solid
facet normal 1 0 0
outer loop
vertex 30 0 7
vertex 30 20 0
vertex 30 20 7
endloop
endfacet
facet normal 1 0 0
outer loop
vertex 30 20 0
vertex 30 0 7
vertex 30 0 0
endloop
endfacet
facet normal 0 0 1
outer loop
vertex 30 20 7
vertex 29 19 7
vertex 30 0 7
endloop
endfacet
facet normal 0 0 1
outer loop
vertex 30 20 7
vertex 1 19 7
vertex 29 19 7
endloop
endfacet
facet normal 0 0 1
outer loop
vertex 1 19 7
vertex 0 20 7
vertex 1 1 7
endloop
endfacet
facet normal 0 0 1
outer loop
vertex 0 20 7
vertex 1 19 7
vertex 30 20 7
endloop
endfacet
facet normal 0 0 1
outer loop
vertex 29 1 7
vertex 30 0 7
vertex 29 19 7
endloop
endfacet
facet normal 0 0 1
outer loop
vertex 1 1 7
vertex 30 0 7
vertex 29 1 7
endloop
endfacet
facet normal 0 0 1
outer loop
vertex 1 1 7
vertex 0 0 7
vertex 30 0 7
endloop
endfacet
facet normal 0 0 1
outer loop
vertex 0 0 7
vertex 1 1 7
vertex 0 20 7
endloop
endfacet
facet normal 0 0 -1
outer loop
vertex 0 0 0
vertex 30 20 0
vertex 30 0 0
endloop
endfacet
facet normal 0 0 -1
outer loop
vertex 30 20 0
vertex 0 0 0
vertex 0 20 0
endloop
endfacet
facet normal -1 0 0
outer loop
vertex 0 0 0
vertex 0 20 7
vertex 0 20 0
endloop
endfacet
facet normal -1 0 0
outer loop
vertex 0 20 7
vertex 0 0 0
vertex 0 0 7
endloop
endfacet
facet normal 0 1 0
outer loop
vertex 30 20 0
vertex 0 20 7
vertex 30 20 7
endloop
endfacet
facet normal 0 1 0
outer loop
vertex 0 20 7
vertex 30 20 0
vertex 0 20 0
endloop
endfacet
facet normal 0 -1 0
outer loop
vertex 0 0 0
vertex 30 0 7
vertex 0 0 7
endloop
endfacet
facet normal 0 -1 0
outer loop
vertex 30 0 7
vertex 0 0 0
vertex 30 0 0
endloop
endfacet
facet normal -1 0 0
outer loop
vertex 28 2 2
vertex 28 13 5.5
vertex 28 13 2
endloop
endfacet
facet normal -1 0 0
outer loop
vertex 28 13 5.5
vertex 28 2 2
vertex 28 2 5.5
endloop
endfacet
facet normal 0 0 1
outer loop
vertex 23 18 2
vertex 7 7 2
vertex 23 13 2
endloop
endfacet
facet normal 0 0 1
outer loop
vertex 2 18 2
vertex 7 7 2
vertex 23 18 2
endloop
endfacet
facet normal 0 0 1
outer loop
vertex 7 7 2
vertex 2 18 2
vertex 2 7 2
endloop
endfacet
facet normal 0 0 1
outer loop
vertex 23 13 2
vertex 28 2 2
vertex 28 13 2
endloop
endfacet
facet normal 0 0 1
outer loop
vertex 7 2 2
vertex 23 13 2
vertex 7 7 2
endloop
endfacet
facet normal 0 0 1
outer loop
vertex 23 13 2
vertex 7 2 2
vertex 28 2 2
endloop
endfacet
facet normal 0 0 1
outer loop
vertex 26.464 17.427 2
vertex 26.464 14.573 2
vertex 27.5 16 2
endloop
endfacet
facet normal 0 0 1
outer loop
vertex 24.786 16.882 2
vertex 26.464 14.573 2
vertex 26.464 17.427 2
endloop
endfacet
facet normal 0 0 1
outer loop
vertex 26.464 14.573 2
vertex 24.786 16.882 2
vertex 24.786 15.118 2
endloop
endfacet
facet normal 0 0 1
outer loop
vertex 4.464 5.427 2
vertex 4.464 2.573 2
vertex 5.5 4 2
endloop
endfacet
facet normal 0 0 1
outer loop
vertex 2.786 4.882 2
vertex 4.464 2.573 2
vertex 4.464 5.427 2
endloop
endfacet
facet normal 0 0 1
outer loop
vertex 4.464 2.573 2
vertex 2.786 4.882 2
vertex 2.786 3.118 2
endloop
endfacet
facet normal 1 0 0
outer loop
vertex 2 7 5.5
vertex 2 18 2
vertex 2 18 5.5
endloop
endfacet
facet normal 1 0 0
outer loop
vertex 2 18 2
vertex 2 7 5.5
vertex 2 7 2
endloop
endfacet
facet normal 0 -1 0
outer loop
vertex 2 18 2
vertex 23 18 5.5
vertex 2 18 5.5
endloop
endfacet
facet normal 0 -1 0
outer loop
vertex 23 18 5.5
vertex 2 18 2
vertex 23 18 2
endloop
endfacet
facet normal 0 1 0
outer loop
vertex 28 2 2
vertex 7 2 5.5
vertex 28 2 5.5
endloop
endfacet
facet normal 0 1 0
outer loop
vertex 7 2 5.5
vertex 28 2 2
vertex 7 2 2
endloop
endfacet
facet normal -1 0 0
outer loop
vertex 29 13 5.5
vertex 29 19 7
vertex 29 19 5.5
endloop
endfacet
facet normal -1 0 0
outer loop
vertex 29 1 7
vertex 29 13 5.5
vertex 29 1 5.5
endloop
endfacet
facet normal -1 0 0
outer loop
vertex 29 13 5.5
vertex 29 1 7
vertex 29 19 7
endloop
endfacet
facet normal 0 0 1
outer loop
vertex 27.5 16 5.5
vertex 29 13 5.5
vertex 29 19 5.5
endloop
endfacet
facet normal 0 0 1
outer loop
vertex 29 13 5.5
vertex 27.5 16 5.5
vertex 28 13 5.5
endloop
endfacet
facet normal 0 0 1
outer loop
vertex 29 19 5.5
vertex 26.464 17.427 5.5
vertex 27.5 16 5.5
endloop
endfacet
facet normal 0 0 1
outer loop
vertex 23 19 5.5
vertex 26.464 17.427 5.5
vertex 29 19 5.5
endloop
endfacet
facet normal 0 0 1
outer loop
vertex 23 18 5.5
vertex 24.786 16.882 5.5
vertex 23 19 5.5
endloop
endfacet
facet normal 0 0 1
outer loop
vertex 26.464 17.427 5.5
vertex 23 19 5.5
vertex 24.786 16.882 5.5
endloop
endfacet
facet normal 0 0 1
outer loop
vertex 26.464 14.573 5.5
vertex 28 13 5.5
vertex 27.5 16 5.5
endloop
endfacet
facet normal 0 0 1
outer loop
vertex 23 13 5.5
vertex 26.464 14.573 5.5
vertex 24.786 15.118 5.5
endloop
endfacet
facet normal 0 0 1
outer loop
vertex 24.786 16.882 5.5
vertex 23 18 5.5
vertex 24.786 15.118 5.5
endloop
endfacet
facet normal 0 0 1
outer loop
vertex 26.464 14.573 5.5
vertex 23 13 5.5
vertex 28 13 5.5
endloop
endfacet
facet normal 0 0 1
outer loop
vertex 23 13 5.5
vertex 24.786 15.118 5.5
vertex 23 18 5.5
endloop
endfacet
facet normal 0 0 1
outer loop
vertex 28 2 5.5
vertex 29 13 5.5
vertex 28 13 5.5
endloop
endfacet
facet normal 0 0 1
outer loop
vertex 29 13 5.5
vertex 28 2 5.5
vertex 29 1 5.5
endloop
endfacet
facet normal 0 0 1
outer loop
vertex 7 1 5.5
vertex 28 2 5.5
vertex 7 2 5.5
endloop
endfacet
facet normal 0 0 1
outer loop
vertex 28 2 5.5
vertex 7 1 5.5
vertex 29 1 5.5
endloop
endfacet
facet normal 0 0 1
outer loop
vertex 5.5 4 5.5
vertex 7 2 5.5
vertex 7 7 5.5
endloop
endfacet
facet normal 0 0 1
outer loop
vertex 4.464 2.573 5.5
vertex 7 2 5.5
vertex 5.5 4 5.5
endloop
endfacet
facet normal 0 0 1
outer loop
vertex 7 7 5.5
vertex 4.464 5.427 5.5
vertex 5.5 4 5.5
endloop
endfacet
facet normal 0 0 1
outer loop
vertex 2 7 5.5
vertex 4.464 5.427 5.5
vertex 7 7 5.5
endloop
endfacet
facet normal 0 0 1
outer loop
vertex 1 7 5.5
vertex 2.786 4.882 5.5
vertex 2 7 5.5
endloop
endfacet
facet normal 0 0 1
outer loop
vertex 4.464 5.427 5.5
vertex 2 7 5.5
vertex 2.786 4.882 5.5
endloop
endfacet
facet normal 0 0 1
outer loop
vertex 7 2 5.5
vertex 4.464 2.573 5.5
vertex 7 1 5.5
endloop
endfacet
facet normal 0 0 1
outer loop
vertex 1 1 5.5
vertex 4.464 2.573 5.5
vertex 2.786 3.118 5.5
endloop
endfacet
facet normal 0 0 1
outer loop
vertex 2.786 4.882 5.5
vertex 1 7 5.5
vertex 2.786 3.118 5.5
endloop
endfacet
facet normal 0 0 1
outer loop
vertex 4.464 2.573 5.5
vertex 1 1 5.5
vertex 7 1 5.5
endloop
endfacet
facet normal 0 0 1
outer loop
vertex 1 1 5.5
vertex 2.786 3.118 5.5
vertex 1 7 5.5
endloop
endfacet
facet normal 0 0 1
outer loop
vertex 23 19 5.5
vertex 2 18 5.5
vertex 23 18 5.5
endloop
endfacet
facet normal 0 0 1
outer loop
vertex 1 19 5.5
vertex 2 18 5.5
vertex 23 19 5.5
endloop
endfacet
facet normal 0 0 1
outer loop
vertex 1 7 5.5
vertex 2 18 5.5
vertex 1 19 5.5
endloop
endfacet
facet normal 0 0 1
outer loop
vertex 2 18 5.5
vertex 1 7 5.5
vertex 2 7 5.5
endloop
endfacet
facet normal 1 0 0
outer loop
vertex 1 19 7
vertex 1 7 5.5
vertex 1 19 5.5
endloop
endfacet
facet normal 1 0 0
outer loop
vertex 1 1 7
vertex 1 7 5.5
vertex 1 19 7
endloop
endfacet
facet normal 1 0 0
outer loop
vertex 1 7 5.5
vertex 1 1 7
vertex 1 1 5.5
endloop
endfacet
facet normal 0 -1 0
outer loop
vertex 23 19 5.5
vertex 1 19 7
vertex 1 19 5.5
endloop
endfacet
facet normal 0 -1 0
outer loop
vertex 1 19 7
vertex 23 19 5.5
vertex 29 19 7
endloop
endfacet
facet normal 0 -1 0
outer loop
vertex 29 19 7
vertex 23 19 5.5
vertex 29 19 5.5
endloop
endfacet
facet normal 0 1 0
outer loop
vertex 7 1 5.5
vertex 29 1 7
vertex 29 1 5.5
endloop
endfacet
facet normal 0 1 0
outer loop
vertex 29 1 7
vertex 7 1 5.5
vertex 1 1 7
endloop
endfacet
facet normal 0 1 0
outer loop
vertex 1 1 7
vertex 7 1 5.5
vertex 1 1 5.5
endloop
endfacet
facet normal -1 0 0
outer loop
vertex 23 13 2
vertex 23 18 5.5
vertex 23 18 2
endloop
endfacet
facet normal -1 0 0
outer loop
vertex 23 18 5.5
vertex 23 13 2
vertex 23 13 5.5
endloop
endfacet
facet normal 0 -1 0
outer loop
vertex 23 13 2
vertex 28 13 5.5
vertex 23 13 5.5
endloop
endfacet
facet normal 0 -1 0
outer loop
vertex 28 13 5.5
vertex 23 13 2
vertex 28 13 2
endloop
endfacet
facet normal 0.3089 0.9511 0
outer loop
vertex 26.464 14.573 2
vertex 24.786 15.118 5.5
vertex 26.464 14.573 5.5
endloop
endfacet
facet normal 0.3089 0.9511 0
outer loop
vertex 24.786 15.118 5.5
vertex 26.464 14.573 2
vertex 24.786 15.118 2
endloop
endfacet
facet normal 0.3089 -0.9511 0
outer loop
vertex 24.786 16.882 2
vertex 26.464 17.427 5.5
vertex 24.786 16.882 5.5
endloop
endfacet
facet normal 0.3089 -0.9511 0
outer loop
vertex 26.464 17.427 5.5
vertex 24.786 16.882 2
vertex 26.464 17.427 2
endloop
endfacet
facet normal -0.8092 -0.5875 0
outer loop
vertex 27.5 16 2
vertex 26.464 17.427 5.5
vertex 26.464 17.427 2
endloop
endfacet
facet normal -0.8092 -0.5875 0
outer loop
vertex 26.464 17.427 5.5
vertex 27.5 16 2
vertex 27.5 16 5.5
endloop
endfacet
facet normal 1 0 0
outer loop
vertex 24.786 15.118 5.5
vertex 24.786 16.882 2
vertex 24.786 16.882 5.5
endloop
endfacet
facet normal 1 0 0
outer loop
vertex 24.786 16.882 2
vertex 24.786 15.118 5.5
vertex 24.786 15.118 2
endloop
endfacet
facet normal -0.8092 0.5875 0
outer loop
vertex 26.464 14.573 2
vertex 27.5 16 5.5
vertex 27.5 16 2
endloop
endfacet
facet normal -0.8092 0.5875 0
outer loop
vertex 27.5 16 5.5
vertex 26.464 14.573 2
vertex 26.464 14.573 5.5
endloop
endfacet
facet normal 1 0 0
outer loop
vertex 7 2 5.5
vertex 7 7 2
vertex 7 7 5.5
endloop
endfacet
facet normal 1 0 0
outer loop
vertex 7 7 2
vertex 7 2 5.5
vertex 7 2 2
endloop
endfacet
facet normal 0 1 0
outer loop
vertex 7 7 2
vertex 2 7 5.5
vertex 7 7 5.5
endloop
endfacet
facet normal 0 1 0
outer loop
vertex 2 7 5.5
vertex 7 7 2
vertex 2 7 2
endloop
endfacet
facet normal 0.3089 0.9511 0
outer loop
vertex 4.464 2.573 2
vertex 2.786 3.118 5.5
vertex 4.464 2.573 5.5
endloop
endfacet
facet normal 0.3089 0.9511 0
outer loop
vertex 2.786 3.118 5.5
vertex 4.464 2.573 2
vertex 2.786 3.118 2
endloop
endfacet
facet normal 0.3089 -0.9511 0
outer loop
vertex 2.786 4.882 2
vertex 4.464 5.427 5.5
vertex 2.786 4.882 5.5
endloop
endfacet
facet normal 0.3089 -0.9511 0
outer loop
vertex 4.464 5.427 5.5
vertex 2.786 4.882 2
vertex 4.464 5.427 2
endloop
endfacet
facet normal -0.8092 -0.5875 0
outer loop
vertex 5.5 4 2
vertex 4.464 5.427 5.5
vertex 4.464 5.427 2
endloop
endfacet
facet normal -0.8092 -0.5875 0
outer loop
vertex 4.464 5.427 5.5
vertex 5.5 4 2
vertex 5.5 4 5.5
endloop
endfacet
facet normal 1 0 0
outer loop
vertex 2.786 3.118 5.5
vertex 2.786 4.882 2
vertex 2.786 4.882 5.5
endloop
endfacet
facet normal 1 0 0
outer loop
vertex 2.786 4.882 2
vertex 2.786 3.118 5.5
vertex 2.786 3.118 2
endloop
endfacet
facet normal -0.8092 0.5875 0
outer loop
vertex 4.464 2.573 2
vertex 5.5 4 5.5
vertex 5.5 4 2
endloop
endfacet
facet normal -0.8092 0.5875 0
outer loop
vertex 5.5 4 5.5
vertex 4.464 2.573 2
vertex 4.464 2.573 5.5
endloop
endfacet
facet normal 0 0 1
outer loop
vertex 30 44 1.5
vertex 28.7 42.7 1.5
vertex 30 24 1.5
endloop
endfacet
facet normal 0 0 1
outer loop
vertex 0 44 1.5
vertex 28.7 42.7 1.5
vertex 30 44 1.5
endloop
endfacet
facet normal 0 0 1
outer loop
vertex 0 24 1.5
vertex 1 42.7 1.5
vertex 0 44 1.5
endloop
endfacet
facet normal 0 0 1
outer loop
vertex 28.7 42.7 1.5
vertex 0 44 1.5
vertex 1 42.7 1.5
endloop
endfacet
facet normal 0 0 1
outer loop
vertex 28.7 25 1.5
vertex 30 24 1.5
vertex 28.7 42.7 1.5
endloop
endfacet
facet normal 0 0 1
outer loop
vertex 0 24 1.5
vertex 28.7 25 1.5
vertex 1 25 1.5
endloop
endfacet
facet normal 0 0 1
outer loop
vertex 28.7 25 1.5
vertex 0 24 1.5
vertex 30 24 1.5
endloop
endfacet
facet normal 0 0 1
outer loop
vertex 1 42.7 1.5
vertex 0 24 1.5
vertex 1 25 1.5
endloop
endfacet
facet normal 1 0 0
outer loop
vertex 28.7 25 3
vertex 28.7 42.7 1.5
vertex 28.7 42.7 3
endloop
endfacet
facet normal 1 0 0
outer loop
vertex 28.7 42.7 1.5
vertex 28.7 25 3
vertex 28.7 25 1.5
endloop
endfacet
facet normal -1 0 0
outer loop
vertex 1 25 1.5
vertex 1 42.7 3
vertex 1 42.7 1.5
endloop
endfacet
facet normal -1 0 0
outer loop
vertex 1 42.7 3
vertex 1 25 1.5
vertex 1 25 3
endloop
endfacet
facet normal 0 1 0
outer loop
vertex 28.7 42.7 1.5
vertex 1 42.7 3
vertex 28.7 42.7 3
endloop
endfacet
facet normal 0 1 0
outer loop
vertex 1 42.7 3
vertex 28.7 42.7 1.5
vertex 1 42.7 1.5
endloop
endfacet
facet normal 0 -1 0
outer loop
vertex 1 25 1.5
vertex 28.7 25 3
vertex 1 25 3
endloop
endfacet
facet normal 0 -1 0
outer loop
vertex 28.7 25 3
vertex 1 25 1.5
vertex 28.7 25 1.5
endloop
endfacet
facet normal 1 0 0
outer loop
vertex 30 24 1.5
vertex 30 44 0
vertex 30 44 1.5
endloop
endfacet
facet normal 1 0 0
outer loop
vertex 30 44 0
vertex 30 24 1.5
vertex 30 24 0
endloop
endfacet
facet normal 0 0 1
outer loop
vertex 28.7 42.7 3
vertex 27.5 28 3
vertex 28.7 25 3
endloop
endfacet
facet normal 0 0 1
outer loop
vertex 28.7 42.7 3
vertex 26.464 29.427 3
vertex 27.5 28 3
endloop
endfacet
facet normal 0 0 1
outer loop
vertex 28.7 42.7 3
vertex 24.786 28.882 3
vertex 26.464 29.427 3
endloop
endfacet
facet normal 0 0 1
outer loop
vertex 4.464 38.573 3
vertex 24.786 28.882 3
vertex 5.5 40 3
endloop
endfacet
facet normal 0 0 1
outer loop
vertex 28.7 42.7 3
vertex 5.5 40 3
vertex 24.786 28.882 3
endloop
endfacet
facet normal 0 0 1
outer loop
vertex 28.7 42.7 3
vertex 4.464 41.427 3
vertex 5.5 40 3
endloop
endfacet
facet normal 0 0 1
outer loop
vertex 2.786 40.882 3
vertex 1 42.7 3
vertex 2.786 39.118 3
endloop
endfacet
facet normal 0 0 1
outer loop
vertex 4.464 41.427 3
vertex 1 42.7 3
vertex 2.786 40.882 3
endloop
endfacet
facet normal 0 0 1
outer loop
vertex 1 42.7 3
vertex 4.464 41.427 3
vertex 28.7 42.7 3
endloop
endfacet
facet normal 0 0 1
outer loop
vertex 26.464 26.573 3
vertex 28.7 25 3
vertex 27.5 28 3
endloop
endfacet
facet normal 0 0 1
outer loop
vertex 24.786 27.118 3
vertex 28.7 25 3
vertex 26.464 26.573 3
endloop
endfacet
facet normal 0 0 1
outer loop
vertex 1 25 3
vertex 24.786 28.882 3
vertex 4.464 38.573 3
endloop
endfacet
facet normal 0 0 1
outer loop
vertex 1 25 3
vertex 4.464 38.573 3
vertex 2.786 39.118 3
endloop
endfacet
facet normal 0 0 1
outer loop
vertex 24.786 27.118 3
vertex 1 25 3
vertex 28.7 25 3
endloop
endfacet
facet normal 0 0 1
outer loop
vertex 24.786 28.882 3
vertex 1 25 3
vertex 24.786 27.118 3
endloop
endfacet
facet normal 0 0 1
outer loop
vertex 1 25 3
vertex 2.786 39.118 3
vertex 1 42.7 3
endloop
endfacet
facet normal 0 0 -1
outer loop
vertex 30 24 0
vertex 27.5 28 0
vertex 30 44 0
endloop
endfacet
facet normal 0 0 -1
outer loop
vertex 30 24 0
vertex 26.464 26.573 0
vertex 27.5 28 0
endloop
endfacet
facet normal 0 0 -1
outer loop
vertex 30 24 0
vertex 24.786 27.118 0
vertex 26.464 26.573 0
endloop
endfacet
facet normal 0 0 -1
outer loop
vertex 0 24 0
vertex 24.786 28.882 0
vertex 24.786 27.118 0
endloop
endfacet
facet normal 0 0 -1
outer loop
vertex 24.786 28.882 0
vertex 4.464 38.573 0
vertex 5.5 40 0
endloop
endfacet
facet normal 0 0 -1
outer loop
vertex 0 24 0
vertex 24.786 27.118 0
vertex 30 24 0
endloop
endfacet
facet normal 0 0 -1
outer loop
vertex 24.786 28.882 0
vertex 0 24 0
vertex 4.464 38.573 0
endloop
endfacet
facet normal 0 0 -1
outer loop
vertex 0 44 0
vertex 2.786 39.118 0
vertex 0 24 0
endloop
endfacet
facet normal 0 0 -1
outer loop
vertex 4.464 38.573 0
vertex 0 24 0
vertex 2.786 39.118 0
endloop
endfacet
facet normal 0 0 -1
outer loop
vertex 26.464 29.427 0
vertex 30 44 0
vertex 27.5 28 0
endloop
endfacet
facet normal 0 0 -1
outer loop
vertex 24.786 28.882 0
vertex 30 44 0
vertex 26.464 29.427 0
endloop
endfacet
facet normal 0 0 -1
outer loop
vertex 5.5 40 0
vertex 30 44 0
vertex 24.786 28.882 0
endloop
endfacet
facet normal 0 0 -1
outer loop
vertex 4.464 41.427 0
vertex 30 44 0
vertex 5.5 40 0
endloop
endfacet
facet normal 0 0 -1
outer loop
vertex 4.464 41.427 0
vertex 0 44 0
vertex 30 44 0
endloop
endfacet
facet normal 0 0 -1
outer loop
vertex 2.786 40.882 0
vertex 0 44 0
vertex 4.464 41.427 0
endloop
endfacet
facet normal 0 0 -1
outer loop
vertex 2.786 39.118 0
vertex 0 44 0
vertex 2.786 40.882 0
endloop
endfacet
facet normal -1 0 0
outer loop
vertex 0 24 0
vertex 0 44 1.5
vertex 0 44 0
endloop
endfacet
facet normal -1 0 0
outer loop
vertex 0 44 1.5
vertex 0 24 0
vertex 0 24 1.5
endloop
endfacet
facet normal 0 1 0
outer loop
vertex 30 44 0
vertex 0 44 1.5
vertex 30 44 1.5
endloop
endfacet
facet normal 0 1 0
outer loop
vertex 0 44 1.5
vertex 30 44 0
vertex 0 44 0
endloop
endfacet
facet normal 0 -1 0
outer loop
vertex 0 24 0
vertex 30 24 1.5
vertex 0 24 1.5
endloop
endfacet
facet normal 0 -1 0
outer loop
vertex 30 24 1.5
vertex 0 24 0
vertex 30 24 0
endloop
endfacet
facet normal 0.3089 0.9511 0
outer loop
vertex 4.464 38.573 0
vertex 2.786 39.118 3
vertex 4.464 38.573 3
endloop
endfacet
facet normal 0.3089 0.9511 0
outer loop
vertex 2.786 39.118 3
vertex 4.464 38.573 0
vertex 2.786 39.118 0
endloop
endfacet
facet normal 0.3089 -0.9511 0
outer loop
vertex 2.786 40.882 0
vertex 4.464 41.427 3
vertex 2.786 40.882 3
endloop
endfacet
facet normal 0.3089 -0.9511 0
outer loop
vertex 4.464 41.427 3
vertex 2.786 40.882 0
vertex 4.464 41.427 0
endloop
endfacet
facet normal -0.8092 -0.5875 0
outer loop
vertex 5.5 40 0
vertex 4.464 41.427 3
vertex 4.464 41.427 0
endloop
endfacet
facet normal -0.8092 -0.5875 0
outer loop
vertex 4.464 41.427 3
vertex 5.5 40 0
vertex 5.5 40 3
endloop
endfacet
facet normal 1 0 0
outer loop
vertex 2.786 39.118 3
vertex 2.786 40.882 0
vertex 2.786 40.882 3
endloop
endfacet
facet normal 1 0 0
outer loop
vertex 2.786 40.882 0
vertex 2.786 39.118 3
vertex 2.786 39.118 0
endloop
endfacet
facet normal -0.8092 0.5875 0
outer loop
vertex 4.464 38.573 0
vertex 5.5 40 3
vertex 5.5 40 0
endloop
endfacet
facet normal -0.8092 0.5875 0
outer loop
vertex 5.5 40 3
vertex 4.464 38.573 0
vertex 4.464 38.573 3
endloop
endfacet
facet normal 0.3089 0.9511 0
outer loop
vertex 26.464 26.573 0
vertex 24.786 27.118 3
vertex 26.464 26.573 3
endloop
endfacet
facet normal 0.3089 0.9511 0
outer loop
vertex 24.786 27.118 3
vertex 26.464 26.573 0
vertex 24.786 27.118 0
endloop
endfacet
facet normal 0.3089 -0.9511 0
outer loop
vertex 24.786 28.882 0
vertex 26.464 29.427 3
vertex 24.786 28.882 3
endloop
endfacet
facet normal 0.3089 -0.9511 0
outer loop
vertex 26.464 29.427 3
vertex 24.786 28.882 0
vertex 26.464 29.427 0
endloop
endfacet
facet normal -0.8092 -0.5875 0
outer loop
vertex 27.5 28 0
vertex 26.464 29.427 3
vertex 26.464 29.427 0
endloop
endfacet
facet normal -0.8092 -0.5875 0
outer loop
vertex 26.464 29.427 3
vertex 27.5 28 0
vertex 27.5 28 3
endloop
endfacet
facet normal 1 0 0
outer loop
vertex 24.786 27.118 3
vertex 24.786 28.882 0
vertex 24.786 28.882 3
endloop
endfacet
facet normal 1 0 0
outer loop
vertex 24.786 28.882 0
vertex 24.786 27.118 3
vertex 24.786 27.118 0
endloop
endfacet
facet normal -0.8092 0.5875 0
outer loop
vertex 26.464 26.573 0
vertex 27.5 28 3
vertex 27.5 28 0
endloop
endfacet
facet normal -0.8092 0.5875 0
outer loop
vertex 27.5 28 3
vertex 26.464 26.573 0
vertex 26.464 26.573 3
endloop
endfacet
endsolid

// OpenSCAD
CxLargura=30;
CxComprimento=20;
CxAltura=7;
caixa();
//tampa();
/*
translate([0,20,10]){
    rotate([180,0,0]){
        tampa();    
    }
    
}
*/



     translate([0,CxComprimento+4,0]){
        tampa();    
    }



module caixa(){
    difference(){
        cube([CxLargura,CxComprimento,CxAltura]);
        translate([2, 2, 2]) {
            cube([CxLargura-4,CxComprimento-4,CxAltura]);
        }
        //borda
        translate([1, 1, CxAltura-1.5]) {
            cube([CxLargura-2,CxComprimento-2,CxAltura]);
        }
    }

    translate([CxLargura-7,CxComprimento-7,0]){
        difference(){
            cube([7,7,CxAltura-1.5]);
            //cylinder(r=2.5, h=CxAltura-3, center=false);
            translate([3,3,2]){
                cylinder(r=1.5, h=CxAltura-1, center=false);
            }
        }
    }
    translate([0,0,0]){
        difference(){
            cube([7,7,CxAltura-1.5]);
            //cylinder(r=2.5, h=CxAltura-3, center=false);
            translate([4,4,2]){
                cylinder(r=1.5, h=CxAltura-1, center=false);
            }
        }
    }

}

module tampa(){

    difference(){
        cube([CxLargura,CxComprimento,3]);
        //furos 
        
        translate([4,CxComprimento- 4,-.5]){
            cylinder(r=1.5, h=4, center=false);
        }

        translate([CxLargura-4,4,-.5]){
            cylinder(r=1.5, h=4, center=false);
        }

        //borda negativa
        
        translate([-1.15,-1.15,1.5]){
            difference(){
                cube([CxLargura+2,CxComprimento+2,2]);
                translate([2.15,2.15,-2]){
                    cube([CxLargura-2.30,CxComprimento-2.30,5]);
                }

            }

        }

        
    }
    
}
